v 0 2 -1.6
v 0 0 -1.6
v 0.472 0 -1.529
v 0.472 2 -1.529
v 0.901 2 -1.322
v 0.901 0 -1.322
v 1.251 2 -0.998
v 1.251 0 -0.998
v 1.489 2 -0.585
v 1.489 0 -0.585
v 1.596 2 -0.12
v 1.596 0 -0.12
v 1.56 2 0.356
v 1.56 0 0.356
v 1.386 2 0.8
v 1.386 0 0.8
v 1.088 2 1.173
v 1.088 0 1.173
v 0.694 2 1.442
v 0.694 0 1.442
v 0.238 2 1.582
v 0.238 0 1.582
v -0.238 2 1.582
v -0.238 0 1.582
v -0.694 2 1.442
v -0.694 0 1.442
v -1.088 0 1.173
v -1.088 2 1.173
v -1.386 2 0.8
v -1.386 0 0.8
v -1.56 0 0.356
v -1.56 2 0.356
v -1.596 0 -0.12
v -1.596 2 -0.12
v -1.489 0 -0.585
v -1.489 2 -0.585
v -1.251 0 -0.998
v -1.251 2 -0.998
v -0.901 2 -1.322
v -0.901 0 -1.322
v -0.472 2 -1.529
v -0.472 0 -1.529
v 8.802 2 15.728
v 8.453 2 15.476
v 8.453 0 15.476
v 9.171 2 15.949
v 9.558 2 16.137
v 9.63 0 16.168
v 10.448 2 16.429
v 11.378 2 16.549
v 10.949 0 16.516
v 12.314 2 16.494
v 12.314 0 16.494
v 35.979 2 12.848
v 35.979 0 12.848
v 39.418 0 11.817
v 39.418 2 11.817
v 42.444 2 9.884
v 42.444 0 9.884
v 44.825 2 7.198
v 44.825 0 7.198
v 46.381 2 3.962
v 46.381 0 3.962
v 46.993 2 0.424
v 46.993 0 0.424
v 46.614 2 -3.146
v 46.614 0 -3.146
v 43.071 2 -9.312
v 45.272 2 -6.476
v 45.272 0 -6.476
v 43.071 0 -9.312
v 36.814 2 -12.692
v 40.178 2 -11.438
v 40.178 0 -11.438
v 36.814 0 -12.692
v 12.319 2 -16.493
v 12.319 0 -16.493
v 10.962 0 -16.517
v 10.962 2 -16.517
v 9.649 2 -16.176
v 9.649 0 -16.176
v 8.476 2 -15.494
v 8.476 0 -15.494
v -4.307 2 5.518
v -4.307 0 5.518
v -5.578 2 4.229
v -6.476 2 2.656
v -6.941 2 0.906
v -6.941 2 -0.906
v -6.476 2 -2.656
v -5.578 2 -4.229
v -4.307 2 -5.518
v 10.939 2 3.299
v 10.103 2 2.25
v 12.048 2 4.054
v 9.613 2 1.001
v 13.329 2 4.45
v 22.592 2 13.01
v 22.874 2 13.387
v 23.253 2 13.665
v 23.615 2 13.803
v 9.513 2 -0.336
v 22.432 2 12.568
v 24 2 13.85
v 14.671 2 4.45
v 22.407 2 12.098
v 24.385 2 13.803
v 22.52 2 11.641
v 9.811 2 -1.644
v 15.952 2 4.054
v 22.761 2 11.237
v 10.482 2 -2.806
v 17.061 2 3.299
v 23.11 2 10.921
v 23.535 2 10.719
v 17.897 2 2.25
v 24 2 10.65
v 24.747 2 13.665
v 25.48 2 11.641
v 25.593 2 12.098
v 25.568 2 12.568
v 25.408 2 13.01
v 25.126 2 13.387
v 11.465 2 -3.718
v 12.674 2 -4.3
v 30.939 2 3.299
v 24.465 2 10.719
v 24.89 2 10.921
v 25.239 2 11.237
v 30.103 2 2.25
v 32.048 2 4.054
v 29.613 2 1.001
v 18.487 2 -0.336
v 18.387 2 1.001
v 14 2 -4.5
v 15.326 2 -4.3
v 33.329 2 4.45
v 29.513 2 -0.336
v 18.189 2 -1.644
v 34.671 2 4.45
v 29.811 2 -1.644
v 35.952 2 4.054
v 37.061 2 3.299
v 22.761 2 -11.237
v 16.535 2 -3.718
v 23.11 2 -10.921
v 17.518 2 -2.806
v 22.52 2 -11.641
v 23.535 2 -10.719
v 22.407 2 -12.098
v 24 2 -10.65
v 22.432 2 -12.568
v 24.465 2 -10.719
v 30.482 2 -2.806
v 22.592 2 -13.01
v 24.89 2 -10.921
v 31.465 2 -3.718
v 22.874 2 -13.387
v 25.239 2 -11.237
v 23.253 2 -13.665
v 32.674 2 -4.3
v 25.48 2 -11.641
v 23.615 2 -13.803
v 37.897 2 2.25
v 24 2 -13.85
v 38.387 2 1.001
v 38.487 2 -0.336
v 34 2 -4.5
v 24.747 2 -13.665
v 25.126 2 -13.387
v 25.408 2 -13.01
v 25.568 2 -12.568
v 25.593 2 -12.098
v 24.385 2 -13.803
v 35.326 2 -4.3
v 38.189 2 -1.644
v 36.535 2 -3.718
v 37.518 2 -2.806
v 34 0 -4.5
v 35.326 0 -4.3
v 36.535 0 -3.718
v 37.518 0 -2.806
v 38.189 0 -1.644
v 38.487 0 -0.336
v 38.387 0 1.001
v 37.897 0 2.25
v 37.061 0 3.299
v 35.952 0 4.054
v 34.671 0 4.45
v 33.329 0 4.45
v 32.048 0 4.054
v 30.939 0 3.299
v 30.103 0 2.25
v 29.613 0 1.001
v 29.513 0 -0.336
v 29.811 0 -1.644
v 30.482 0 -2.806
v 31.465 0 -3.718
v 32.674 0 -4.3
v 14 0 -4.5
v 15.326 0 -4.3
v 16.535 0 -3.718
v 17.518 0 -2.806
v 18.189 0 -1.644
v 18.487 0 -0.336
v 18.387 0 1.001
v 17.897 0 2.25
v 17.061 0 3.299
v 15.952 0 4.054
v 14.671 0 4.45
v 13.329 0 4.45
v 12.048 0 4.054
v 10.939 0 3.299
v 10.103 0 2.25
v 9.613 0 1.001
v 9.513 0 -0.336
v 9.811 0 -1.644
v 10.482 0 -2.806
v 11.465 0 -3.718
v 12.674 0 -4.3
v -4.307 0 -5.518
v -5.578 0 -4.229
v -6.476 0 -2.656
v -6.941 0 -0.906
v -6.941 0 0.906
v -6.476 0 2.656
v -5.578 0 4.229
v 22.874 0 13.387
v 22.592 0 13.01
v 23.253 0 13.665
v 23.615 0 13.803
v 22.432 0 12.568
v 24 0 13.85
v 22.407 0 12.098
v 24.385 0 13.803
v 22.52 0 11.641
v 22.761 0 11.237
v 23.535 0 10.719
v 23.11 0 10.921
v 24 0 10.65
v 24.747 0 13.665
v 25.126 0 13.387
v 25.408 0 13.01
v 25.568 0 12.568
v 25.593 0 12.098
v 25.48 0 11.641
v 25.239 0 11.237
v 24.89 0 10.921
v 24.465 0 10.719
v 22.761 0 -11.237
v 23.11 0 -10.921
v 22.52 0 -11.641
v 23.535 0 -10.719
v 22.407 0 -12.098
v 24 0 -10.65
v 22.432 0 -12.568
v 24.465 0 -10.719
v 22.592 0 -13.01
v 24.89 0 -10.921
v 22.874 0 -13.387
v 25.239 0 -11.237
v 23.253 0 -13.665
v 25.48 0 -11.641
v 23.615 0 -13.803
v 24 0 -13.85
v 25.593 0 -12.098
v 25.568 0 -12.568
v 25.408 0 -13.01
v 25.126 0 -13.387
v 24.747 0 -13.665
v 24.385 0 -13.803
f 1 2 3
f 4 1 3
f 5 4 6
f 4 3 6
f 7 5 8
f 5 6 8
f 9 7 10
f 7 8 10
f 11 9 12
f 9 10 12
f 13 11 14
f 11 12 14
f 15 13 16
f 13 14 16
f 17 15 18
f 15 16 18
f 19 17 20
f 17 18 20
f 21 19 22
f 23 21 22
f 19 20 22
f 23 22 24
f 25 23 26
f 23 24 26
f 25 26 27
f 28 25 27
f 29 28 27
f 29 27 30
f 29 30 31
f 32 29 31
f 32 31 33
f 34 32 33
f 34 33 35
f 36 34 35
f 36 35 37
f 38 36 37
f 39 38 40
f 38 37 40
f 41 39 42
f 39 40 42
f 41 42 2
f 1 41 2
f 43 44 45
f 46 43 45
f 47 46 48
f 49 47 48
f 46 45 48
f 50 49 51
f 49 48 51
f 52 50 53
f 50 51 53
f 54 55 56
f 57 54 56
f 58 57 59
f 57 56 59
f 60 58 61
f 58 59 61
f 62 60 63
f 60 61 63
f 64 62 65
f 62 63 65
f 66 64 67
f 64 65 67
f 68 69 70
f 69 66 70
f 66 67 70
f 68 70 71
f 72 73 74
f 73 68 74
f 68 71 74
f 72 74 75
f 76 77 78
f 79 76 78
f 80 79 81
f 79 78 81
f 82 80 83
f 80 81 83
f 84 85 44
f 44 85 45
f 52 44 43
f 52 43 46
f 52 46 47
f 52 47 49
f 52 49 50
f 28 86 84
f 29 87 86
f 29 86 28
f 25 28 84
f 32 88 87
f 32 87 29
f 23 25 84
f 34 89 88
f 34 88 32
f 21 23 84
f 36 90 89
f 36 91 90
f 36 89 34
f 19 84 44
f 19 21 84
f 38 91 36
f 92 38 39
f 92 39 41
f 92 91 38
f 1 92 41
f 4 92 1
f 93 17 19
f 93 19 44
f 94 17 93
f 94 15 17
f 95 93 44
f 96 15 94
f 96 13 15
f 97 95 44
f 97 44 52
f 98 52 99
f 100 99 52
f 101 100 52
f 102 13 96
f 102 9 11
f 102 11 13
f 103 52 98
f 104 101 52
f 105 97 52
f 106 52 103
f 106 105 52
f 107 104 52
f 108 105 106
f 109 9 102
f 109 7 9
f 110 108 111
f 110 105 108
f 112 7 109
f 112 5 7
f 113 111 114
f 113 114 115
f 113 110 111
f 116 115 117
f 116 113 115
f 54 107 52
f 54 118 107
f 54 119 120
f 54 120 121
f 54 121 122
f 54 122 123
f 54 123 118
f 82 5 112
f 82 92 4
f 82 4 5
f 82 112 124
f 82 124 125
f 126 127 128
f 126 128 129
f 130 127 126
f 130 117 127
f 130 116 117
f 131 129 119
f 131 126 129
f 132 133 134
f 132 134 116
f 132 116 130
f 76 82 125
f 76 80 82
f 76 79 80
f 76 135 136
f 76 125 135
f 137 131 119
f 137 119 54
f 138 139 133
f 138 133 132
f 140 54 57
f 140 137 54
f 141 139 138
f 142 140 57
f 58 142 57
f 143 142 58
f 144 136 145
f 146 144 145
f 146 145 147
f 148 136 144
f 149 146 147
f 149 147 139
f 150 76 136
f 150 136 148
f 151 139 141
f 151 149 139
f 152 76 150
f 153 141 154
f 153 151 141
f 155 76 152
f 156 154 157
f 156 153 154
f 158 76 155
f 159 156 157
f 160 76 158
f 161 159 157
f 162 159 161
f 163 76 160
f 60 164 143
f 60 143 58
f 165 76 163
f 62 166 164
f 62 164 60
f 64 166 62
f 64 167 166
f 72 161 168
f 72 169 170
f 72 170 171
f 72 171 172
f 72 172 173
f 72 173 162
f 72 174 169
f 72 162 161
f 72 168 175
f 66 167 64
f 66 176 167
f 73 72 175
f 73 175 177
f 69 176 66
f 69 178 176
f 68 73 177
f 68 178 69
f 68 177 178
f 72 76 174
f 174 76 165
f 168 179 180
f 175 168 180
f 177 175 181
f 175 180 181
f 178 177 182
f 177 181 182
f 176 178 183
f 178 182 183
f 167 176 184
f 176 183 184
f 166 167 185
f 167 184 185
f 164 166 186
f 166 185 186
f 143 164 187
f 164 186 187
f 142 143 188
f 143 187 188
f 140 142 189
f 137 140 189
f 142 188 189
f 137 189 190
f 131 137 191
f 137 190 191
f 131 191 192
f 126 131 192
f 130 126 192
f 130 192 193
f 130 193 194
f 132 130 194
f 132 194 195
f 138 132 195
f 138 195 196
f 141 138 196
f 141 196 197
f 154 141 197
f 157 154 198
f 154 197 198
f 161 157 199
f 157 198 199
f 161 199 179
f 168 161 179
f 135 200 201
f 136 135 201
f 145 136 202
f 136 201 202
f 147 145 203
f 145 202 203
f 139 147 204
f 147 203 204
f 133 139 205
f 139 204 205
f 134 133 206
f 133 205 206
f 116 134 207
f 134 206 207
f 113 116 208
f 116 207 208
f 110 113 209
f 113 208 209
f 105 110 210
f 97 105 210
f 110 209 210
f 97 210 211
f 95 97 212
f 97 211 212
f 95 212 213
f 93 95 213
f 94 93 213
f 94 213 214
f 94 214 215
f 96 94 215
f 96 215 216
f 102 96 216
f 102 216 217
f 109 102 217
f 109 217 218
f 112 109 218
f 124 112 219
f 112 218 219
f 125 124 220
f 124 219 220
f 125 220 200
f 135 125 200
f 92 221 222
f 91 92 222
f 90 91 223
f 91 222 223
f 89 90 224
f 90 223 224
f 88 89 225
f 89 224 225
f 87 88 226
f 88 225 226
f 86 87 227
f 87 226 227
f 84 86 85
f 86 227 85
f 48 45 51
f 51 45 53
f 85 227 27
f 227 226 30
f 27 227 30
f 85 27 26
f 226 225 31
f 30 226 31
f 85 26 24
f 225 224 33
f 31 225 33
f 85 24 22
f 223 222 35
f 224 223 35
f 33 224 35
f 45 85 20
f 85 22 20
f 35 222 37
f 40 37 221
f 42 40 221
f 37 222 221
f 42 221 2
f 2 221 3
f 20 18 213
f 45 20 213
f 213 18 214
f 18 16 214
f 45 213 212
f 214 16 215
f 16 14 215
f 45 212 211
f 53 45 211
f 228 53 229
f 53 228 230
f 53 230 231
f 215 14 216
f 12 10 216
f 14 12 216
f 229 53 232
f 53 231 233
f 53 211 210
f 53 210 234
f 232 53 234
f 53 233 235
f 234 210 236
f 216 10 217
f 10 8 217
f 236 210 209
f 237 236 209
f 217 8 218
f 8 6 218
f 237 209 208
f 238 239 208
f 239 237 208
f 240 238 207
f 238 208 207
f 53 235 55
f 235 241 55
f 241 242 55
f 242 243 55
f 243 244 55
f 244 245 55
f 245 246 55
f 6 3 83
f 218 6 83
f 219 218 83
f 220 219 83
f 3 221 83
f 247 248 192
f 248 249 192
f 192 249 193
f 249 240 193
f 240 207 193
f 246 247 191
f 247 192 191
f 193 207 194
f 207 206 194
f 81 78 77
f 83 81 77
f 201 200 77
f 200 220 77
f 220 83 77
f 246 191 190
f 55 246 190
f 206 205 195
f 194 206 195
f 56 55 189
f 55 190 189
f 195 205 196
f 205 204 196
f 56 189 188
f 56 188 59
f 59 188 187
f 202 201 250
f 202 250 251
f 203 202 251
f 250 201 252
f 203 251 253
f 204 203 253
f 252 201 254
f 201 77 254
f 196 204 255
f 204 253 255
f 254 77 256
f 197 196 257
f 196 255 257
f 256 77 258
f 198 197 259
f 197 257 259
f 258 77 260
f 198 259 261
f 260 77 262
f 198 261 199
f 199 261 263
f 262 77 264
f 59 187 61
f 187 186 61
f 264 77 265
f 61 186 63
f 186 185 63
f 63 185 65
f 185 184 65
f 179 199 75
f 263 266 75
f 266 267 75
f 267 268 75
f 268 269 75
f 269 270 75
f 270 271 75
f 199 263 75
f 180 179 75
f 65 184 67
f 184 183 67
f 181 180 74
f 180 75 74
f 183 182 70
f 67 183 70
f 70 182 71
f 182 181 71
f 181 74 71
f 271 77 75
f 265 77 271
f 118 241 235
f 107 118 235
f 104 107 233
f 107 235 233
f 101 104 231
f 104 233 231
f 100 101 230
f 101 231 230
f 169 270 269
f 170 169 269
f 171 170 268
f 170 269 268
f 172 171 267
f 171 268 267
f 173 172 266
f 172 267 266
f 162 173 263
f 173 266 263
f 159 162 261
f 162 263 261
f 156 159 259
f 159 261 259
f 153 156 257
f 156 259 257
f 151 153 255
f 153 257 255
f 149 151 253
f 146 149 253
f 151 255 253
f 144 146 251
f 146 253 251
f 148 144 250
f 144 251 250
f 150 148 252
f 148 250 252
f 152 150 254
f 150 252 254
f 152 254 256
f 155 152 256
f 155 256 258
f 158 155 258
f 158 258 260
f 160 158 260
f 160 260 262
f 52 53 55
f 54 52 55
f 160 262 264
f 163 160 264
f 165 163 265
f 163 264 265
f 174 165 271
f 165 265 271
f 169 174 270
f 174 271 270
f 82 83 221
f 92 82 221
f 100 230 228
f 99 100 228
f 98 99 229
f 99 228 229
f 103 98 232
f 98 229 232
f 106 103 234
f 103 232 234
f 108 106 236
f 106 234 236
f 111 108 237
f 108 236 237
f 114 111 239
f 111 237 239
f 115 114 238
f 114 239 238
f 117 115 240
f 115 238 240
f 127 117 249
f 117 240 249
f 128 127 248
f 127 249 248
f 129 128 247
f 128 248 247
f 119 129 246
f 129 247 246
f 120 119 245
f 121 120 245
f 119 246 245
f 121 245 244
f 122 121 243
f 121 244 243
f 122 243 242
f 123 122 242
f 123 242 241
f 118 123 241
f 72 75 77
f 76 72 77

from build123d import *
from build123d.topology import SkipClean

# Parameters (mm, degrees)
SKETCH1_R               = 1.6
SKETCH1_R_2             = 1
SKETCH1_R_3             = 5.5
SKETCH1_R_4             = 4.5
BOSS_EXTRUDE2_DEPTH     = 2
BOSS_EXTRUDE3_START     = -2
SKETCH2_R               = 1
BOSS_EXTRUDE3_DEPTH     = 2
SKETCH3_R               = 1
CUT_EXTRUDE1_DEPTH      = 103
BOSS_EXTRUDE4_OUTLINE_R = 1
BOSS_EXTRUDE4_DEPTH     = 10
SKETCH5_R               = 87.063932705
CUT_EXTRUDE2_DEPTH      = 2
BOSS_EXTRUDE5_START     = 2
SKETCH6_R               = 1
SKETCH6_R_2             = 1.6
SKETCH6_R_3             = 4.5
BOSS_EXTRUDE5_DEPTH     = 2
SKETCH7_R               = 66.92041454
CUT_EXTRUDE3_DEPTH      = 10
SKETCH8_R               = 1.6
CUT_EXTRUDE4_DEPTH      = 10
BOSS_EXTRUDE6_DEPTH     = 2


# Read off the part's stored shape, not the designer's step: Boss-Extrude4
with BuildPart() as part:
    # Sketch1 → Boss-Extrude2 (new body)
    with BuildSketch(Plane(origin=(0, 0, 0), x_dir=(1, 0, 0), z_dir=(0, 1, 0))):
        with BuildLine():
            Line((12.313589515, -16.493996637), (35.979225245, -12.848450001))
            ThreePointArc((35.979225245, -12.848450001), (46.993067566, -0.424494085), (36.813648041, 12.691862933))
            Line((36.813648041, 12.691862933), (35.165189196, 12.947676785))
            Line((35.165189196, 12.947676785), (12.319067304, 16.493021261))
            ThreePointArc((12.319067304, 16.493021261), (11.720527595, 16.549330191), (11.119556233, 16.533395936))
            Line((11.119556233, 16.533395936), (-11.812019178, 14.541098507))
            ThreePointArc((-11.812019178, 14.541098507), (-13.247239988, 14.027709898), (-14.244912332, 12.87528787))
            Line((-14.244912332, 12.87528787), (-19.487592157, 2.204884721))
            ThreePointArc((-19.487592157, 2.204884721), (-19.693653105, -1.723258696), (-16.994761113, -4.584858569))
            Line((-16.994761113, -4.584858569), (9.557587922, -16.137143667))
            ThreePointArc((9.557587922, -16.137143667), (10.910298182, -16.51089082), (12.313589515, -16.493996637))
        make_face()
        with Locations(Location((11.552349036, -11.552285098, 0), (0, 0, 270))):
            Circle(SKETCH1_R, mode=Mode.SUBTRACT)
        with Locations(Location((25, -11, 0), (0, 0, 270))):
            Circle(SKETCH1_R_2, mode=Mode.SUBTRACT)
        with Locations(Location((-15, 0, 0), (0, 0, 270))):
            Circle(SKETCH1_R, mode=Mode.SUBTRACT)
        with Locations(Location((0, 0, 0), (0, 0, 270))):
            Circle(SKETCH1_R_3, mode=Mode.SUBTRACT)
        with Locations(Location((-11.552357038, 11.552357038, 0), (0, 0, 270))):
            Circle(SKETCH1_R, mode=Mode.SUBTRACT)
        with Locations(Location((11.552326466, 11.552160153, 0), (0, 0, 270))):
            Circle(SKETCH1_R, mode=Mode.SUBTRACT)
        with Locations(Location((14, 0, 0), (0, 0, 270))):
            Circle(SKETCH1_R_4, mode=Mode.SUBTRACT)
        with Locations(Location((34, 0, 0), (0, 0, 270))):
            Circle(SKETCH1_R_4, mode=Mode.SUBTRACT)
        with Locations(Location((25, 11, 0), (0, 0, 270))):
            Circle(SKETCH1_R_2, mode=Mode.SUBTRACT)
    extrude(amount=BOSS_EXTRUDE2_DEPTH)

    # Sketch2 → Boss-Extrude3 (add)
    with BuildSketch(Plane(origin=(0, 2, 0), x_dir=(1, 0, 0), z_dir=(0, 1, 0)).offset(BOSS_EXTRUDE3_START)):
        with Locations((25, 11)):
            Circle(SKETCH2_R)
        with Locations((25, -11)):
            Circle(SKETCH2_R)
    extrude(amount=BOSS_EXTRUDE3_DEPTH)

    # Sketch3 → Cut-Extrude1 (cut)
    with BuildSketch(Plane(origin=(0, 2, 0), x_dir=(1, 0, 0), z_dir=(0, 1, 0))):
        with Locations(Location((24, 13, 0), (0, 0, 270))):
            Circle(SKETCH3_R)
        with Locations(Location((24, -13, 0), (0, 0, 270))):
            Circle(SKETCH3_R)
    extrude(amount=-CUT_EXTRUDE1_DEPTH, mode=Mode.SUBTRACT)

    # Boss-Extrude4 outline → Boss-Extrude4 (add)
    with SkipClean():  # the faces are left unmerged after this step: merging them gives an invalid solid
        with BuildSketch(Plane(origin=(0, 2, 0), x_dir=(1, 0, 0), z_dir=(0, 1, 0))):
            with BuildLine():
                ThreePointArc((8.453372169, -15.47610242), (10.277484332, -16.387026041), (12.313589515, -16.493996637))
                Line((12.313589515, -16.493996637), (35.979225245, -12.848450001))
                ThreePointArc((35.979225245, -12.848450001), (46.993067566, -0.424494085), (36.813648041, 12.691862933))
                Line((36.813648041, 12.691862933), (12.319067304, 16.493021261))
                ThreePointArc((12.319067304, 16.493021261), (10.294223964, 16.391290043), (8.476229775, 15.493940099))
                Line((8.476229775, 15.493940099), (-4.306535369, 5.518491924))
                ThreePointArc((-4.306535369, 5.518491924), (-7, 0), (-4.306535369, -5.518491924))
                Line((-4.306535369, -5.518491924), (8.453372169, -15.47610242))
            make_face()
            with Locations((24, -13)):
                Circle(BOSS_EXTRUDE4_OUTLINE_R, mode=Mode.SUBTRACT)
            with BuildLine():
                Line((35.738243971, -12.126046672), (26.117255626, -13.608064851))
                Line((26.117255626, -13.608064851), (25.976685738, -12.695511096))
                ThreePointArc((25.976685738, -12.695511096), (23.695511096, -11.023314262), (22.023314262, -13.304488904))
                Line((22.023314262, -13.304488904), (22.16388415, -14.217042659))
                Line((22.16388415, -14.217042659), (12.27862862, -15.739768587))
                ThreePointArc((12.27862862, -15.739768587), (10.519552717, -15.67488522), (8.937649363, -14.902784407))
                Line((8.937649363, -14.902784407), (-3.845146577, -4.927204867))
                ThreePointArc((-3.845146577, -4.927204867), (-6.249813783, 0.048245957), (-3.768620923, 4.985979978))
                Line((-3.768620923, 4.985979978), (9.140409076, 14.743187339))
                ThreePointArc((9.140409076, 14.743187339), (10.553310252, 15.425397379), (12.119916334, 15.511685597))
                Line((12.119916334, 15.511685597), (22.133828609, 14.076211769))
                Line((22.133828609, 14.076211769), (22.020237278, 13.283794934))
                ThreePointArc((22.020237278, 13.283794934), (23.716205066, 11.020237278), (25.979762722, 12.716205066))
                Line((25.979762722, 12.716205066), (26.093354053, 13.508621901))
                Line((26.093354053, 13.508621901), (35.738243971, 12.126046672))
                ThreePointArc((35.738243971, 12.126046672), (46.25, 0), (35.738243971, -12.126046672))
            make_face(mode=Mode.SUBTRACT)
            with Locations((24, 13)):
                Circle(BOSS_EXTRUDE4_OUTLINE_R, mode=Mode.SUBTRACT)
        extrude(amount=BOSS_EXTRUDE4_DEPTH)
    add(part.part.scale(1), mode=Mode.REPLACE)  # the faces are merged on a copy

    # Sketch5 → Cut-Extrude2 (cut)
    with BuildSketch(Plane(origin=(0, 0, 0), x_dir=(-1, 0, 0), z_dir=(0, -1, 0))):
        Circle(SKETCH5_R)
    extrude(amount=-CUT_EXTRUDE2_DEPTH, mode=Mode.SUBTRACT)

    # Sketch6 → Boss-Extrude5 (add)
    with BuildSketch(Plane(origin=(0, 2, 0), x_dir=(-1, 0, 0), z_dir=(0, -1, 0)).offset(BOSS_EXTRUDE5_START)):
        with BuildLine():
            Line((4.306535369, -5.518491924), (-8.453372169, -15.47610242))
            ThreePointArc((-8.453372169, -15.47610242), (-10.277484331, -16.387026041), (-12.313589515, -16.493996637))
            Line((-12.313589515, -16.493996637), (-35.979225245, -12.848450001))
            ThreePointArc((-35.979225245, -12.848450001), (-46.993067566, -0.424494085), (-36.813648041, 12.691862933))
            Line((-36.813648041, 12.691862933), (-12.319067304, 16.493021261))
            ThreePointArc((-12.319067304, 16.493021261), (-10.294223964, 16.391290043), (-8.476229775, 15.493940099))
            Line((-8.476229775, 15.493940099), (4.306535369, 5.518491924))
            ThreePointArc((4.306535369, 5.518491924), (7, 0), (4.306535369, -5.518491924))
        make_face()
        with Locations(Location((-24, -13, 0), (0, 0, 270))):
            Circle(SKETCH6_R, mode=Mode.SUBTRACT)
        with Locations(Location((-24, 13, 0), (0, 0, 270))):
            Circle(SKETCH6_R, mode=Mode.SUBTRACT)
        with Locations(Location((0, 0, 0), (0, 0, 90))):
            Circle(SKETCH6_R_2, mode=Mode.SUBTRACT)
        with Locations(Location((-34, 0, 0), (0, 0, 90))):
            Circle(SKETCH6_R_3, mode=Mode.SUBTRACT)
        with Locations(Location((-14, 0, 0), (0, 0, 90))):
            Circle(SKETCH6_R_3, mode=Mode.SUBTRACT)
    extrude(amount=-BOSS_EXTRUDE5_DEPTH)

    # Sketch7 → Cut-Extrude3 (cut)
    with BuildSketch(Plane(origin=(0, 12, 0), x_dir=(1, 0, 0), z_dir=(0, 1, 0))):
        Circle(SKETCH7_R)
    extrude(amount=-CUT_EXTRUDE3_DEPTH, mode=Mode.SUBTRACT)

    # Sketch8 → Cut-Extrude4 (cut)
    with BuildSketch(Plane(origin=(0, 0, 0), x_dir=(-1, 0, 0), z_dir=(0, -1, 0))):
        with Locations((-24, -12.25)):
            Circle(SKETCH8_R)
        with Locations((-24, 12.25)):
            Circle(SKETCH8_R)
    extrude(amount=-CUT_EXTRUDE4_DEPTH, mode=Mode.SUBTRACT)

    # Sketch9 → Boss-Extrude6 (add)
    with BuildSketch(Plane(origin=(0, 0, 0), x_dir=(-1, 0, 0), z_dir=(0, -1, 0))):
        with BuildLine():
            ThreePointArc((-24.746843357, -13.665), (-24, -13.85), (-23.253156643, -13.665))
            ThreePointArc((-23.253156643, -13.665), (-24, -14), (-24.746843357, -13.665))
        make_face()
        with BuildLine():
            ThreePointArc((-23.253156643, 13.665), (-24, 13.85), (-24.746843357, 13.665))
            ThreePointArc((-24.746843357, 13.665), (-24, 14), (-23.253156643, 13.665))
        make_face()
    extrude(amount=-BOSS_EXTRUDE6_DEPTH)


solid = part.part
